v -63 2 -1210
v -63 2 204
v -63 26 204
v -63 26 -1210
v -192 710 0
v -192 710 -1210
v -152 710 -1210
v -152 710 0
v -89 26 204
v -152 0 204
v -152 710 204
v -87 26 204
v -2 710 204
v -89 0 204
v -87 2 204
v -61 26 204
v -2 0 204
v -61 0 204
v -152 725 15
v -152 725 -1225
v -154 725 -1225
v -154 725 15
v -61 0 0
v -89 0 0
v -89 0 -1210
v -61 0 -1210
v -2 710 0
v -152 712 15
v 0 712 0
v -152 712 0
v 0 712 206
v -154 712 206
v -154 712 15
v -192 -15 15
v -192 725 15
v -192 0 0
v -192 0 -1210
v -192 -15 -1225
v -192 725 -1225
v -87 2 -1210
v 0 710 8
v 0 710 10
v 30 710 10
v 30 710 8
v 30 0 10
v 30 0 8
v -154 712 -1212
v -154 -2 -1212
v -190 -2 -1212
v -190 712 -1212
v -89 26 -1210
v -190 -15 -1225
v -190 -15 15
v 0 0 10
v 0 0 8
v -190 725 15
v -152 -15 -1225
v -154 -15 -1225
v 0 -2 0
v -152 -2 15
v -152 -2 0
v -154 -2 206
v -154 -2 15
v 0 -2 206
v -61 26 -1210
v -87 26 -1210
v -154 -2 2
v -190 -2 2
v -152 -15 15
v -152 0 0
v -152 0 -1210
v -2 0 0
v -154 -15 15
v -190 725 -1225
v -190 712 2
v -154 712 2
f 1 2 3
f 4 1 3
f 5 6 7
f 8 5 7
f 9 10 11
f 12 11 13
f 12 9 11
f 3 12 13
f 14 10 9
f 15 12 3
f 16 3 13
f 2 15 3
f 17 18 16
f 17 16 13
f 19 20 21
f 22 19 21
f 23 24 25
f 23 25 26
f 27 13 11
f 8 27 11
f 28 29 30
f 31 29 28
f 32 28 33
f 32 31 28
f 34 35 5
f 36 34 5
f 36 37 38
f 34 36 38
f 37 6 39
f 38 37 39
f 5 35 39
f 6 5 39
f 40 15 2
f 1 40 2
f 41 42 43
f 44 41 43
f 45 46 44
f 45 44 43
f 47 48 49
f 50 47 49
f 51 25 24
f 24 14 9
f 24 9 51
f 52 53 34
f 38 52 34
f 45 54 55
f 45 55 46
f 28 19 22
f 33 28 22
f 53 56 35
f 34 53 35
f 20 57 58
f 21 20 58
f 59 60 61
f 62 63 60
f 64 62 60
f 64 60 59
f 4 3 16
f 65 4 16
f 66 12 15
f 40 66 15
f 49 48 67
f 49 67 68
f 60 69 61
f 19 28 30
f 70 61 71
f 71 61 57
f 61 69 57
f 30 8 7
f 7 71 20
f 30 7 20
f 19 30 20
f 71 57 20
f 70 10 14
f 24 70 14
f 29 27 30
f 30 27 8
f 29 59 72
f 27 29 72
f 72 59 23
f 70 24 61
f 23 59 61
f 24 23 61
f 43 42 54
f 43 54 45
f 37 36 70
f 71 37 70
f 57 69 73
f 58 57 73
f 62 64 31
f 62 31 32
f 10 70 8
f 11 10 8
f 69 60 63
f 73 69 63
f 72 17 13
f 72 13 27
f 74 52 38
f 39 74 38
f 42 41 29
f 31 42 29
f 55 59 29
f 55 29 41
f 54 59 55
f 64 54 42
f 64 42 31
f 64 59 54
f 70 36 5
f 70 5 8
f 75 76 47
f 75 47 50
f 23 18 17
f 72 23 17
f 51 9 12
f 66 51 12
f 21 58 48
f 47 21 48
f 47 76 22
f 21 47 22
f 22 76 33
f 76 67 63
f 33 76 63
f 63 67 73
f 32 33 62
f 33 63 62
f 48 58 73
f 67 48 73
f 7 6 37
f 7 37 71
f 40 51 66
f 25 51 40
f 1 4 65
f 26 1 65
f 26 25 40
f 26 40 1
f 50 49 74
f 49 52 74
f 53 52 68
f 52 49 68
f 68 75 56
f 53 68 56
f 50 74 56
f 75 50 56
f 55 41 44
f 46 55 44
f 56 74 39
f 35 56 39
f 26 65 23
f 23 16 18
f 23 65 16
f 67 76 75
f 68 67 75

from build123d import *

# Parameters (mm, degrees)
F0_W      = 30
F0_H      = 2
F1_DEPTH  = 710
F8_DEPTH  = 1414
F9_W      = 154
F9_H      = 206
F10_DEPTH = 2
F11_W     = 154
F11_H     = 206
F12_DEPTH = 2


with BuildPart() as f1:
    # F0 (on Front) → F1 (new body)
    with BuildSketch(Plane.XZ):
        Polygon((-2, 0), (0, 0), (0, 8), (0, 10), (0, 206), (-154, 206), (-154, 0), (-152, 0), (-152, 204), (-2, 204), align=None)
        with Locations((15, 9)):
            Rectangle(F0_W, F0_H)
    extrude(amount=-F1_DEPTH)

    # F6: sweep along a path in F3
    with BuildLine(Plane.YZ.offset(-152)) as f6_path:
        Line((0, 0), (710, 0))
        Line((710, 0), (710, -1210))
        Line((710, -1210), (0, -1210))
        Line((0, -1210), (0, 0))
    # F5 (on offset) → F6 (sweep)
    with BuildSketch(Plane.XZ):
        Polygon((-192, 0), (-152, 0), (-152, 15), (-154, 15), (-154, 2), (-190, 2), (-190, 15), (-192, 15), align=None)
    sweep(path=f6_path.line, transition=Transition.RIGHT)

    # F7 (on face) → F8 (join, through all)
    with BuildSketch(Plane(origin=(0, 0, 204), x_dir=(1, 0, 0), z_dir=(0, 0, -1))):
        Polygon((-75, 0), (-77, 0), (-89, 0), (-89, -26), (-87, -26), (-87, -2), (-75, -2), (-63, -2), (-63, -26), (-61, -26), (-61, 0), align=None)
    extrude(amount=F8_DEPTH)

    # F9 (on face) → F10 (join)
    with BuildSketch(Plane.XZ):
        with Locations((-77, 103)):
            Rectangle(F9_W, F9_H)
    extrude(amount=F10_DEPTH)

    # F11 (on face) → F12 (join)
    with BuildSketch(Plane(origin=(0, 710, 0), x_dir=(-1, 0, 0), z_dir=(0, 1, 0))):
        with Locations((77, 103)):
            Rectangle(F11_W, F11_H)
    extrude(amount=F12_DEPTH)


solid = f1.part
